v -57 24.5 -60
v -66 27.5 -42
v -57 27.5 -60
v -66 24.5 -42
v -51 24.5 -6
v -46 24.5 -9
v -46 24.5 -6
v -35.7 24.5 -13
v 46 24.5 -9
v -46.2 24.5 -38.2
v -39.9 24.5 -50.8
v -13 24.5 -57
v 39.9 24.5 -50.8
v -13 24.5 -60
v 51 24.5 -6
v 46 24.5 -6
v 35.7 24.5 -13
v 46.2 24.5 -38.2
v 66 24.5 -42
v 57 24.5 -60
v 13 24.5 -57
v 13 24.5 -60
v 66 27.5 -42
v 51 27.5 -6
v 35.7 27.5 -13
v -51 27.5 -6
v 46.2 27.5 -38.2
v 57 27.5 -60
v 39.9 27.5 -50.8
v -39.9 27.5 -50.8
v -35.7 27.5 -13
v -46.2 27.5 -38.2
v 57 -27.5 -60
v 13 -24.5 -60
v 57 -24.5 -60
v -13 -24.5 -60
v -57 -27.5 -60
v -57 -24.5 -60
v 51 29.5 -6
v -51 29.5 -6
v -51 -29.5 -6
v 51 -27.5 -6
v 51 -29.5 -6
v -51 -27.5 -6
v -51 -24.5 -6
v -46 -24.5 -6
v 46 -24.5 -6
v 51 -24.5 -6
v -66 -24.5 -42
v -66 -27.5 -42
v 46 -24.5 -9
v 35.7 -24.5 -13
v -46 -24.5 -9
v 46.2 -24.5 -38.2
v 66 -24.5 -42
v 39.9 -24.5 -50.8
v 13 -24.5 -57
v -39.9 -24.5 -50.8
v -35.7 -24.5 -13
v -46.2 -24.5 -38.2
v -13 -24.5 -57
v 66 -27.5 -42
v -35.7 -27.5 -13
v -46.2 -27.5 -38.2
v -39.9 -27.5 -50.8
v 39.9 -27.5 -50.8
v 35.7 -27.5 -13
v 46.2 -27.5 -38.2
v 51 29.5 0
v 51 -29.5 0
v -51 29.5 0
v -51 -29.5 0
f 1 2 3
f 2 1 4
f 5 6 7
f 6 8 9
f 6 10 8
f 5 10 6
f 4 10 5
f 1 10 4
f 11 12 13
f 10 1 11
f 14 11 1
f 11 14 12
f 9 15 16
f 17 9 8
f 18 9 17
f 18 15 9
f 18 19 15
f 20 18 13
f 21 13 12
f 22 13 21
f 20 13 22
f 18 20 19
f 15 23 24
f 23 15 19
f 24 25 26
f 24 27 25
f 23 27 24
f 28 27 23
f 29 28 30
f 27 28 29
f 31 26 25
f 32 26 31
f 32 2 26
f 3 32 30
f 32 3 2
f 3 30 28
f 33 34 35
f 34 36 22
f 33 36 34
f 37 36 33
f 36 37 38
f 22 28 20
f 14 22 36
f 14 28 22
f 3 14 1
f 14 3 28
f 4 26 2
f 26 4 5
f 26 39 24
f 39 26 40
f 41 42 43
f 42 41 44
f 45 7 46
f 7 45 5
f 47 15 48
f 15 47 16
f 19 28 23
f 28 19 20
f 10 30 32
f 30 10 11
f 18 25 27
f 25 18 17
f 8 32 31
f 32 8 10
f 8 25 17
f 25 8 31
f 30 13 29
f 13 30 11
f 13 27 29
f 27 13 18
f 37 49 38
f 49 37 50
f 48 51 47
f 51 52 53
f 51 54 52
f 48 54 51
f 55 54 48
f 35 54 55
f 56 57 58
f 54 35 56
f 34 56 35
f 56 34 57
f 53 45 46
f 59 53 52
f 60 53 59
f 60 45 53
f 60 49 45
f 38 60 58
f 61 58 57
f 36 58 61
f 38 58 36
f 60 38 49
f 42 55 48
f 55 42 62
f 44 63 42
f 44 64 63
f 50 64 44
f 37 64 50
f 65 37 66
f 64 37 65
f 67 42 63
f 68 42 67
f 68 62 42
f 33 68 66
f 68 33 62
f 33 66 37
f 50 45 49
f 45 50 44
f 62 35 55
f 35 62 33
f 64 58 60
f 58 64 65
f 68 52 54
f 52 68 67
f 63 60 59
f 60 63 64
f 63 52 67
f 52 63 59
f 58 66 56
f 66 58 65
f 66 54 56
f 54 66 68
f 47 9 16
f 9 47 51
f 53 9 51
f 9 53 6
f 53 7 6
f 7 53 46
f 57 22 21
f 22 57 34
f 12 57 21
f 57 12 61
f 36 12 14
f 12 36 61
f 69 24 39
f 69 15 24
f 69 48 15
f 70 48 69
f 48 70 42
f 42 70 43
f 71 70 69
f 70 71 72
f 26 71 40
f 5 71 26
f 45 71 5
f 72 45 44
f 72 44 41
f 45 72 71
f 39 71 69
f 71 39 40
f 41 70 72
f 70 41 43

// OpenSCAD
// file: constants.scad
$fa = 1;
$fs = 0.4;

skate_width = 143; // measured
skate_length = 172; // measured
truck_frame_top_length = 102;
truck_middle_length = 132;
truck_bottom_length = 114;
truck_sheet_thickness = 3;
truck_middle_height = 36;
truck_frame_height = 54;
truck_full_width = 55;
truck_frame_connection_width = 6;
gap_around_skate = 2;
wall_width = 3;
wall_height = 30;
latch_length = 30;
latch_width = 20;
deck_thickness = 10.5; // measured
clip_thickness = 3;
clip_wall_width = 3;
spring_axle_length = 14; // measured
spring_axle_diameter = 7; // measured
spring_arm_length = 21; // measured from axle center
bolt_diameter = 3;
corner_radius = 45;
skate_overlap = 28;
spring_wire_width = 1.3;
cliphouse_wall_width = 3;
cliphouse_side_wall_width = 5;
clip_width = spring_axle_length + 2 * clip_wall_width;
epsilon = 0.01;
gap = 0.8; // tried 0.5 but it was slightly too low
// main file
include <constants.scad>

module truck_frame_profile() {
    polygon(points =
              [[-truck_frame_top_length / 2, 0],
               [-truck_middle_length / 2, truck_middle_height],
               [-truck_bottom_length / 2, truck_frame_height],
               [truck_bottom_length / 2, truck_frame_height],
               [truck_middle_length / 2, truck_middle_height],
               [truck_frame_top_length / 2, 0]
               ] );
}

module truck_frame_side() {
    translate([0,
               truck_full_width / 2 - truck_sheet_thickness,
               0])
        rotate([270, 0, 0])
            difference() {
                linear_extrude(height = truck_sheet_thickness)
                    truck_frame_profile();
                translate([0, 7, -epsilon])
                    linear_extrude(height = truck_sheet_thickness + epsilon * 2)
                        scale(0.7)
                            truck_frame_profile();
            }
}

module truck_frame_connection() {
    color("grey")
        cube([truck_frame_top_length,
              truck_full_width + 4,
              truck_frame_connection_width], center=true);
}

module truck_frame() {
    truck_frame_side();
    mirror([0, 1, 0]) truck_frame_side();

    translate([0, 0, -truck_sheet_thickness / 2])
        cube([truck_frame_top_length - 10,
              truck_full_width - 2 * truck_sheet_thickness + epsilon * 2,
              truck_sheet_thickness], center=true);

    translate([0, 0, -truck_frame_height + truck_sheet_thickness / 2])
        cube([26,
              truck_full_width - 2 * truck_sheet_thickness + epsilon * 2,
              truck_sheet_thickness], center=true);
}

module truck() {
    color("#b0b0b0")
        translate([0, 0, -truck_frame_connection_width])
            truck_frame();
    translate([0, 0, -truck_frame_connection_width / 2])
        truck_frame_connection();
}

truck();
